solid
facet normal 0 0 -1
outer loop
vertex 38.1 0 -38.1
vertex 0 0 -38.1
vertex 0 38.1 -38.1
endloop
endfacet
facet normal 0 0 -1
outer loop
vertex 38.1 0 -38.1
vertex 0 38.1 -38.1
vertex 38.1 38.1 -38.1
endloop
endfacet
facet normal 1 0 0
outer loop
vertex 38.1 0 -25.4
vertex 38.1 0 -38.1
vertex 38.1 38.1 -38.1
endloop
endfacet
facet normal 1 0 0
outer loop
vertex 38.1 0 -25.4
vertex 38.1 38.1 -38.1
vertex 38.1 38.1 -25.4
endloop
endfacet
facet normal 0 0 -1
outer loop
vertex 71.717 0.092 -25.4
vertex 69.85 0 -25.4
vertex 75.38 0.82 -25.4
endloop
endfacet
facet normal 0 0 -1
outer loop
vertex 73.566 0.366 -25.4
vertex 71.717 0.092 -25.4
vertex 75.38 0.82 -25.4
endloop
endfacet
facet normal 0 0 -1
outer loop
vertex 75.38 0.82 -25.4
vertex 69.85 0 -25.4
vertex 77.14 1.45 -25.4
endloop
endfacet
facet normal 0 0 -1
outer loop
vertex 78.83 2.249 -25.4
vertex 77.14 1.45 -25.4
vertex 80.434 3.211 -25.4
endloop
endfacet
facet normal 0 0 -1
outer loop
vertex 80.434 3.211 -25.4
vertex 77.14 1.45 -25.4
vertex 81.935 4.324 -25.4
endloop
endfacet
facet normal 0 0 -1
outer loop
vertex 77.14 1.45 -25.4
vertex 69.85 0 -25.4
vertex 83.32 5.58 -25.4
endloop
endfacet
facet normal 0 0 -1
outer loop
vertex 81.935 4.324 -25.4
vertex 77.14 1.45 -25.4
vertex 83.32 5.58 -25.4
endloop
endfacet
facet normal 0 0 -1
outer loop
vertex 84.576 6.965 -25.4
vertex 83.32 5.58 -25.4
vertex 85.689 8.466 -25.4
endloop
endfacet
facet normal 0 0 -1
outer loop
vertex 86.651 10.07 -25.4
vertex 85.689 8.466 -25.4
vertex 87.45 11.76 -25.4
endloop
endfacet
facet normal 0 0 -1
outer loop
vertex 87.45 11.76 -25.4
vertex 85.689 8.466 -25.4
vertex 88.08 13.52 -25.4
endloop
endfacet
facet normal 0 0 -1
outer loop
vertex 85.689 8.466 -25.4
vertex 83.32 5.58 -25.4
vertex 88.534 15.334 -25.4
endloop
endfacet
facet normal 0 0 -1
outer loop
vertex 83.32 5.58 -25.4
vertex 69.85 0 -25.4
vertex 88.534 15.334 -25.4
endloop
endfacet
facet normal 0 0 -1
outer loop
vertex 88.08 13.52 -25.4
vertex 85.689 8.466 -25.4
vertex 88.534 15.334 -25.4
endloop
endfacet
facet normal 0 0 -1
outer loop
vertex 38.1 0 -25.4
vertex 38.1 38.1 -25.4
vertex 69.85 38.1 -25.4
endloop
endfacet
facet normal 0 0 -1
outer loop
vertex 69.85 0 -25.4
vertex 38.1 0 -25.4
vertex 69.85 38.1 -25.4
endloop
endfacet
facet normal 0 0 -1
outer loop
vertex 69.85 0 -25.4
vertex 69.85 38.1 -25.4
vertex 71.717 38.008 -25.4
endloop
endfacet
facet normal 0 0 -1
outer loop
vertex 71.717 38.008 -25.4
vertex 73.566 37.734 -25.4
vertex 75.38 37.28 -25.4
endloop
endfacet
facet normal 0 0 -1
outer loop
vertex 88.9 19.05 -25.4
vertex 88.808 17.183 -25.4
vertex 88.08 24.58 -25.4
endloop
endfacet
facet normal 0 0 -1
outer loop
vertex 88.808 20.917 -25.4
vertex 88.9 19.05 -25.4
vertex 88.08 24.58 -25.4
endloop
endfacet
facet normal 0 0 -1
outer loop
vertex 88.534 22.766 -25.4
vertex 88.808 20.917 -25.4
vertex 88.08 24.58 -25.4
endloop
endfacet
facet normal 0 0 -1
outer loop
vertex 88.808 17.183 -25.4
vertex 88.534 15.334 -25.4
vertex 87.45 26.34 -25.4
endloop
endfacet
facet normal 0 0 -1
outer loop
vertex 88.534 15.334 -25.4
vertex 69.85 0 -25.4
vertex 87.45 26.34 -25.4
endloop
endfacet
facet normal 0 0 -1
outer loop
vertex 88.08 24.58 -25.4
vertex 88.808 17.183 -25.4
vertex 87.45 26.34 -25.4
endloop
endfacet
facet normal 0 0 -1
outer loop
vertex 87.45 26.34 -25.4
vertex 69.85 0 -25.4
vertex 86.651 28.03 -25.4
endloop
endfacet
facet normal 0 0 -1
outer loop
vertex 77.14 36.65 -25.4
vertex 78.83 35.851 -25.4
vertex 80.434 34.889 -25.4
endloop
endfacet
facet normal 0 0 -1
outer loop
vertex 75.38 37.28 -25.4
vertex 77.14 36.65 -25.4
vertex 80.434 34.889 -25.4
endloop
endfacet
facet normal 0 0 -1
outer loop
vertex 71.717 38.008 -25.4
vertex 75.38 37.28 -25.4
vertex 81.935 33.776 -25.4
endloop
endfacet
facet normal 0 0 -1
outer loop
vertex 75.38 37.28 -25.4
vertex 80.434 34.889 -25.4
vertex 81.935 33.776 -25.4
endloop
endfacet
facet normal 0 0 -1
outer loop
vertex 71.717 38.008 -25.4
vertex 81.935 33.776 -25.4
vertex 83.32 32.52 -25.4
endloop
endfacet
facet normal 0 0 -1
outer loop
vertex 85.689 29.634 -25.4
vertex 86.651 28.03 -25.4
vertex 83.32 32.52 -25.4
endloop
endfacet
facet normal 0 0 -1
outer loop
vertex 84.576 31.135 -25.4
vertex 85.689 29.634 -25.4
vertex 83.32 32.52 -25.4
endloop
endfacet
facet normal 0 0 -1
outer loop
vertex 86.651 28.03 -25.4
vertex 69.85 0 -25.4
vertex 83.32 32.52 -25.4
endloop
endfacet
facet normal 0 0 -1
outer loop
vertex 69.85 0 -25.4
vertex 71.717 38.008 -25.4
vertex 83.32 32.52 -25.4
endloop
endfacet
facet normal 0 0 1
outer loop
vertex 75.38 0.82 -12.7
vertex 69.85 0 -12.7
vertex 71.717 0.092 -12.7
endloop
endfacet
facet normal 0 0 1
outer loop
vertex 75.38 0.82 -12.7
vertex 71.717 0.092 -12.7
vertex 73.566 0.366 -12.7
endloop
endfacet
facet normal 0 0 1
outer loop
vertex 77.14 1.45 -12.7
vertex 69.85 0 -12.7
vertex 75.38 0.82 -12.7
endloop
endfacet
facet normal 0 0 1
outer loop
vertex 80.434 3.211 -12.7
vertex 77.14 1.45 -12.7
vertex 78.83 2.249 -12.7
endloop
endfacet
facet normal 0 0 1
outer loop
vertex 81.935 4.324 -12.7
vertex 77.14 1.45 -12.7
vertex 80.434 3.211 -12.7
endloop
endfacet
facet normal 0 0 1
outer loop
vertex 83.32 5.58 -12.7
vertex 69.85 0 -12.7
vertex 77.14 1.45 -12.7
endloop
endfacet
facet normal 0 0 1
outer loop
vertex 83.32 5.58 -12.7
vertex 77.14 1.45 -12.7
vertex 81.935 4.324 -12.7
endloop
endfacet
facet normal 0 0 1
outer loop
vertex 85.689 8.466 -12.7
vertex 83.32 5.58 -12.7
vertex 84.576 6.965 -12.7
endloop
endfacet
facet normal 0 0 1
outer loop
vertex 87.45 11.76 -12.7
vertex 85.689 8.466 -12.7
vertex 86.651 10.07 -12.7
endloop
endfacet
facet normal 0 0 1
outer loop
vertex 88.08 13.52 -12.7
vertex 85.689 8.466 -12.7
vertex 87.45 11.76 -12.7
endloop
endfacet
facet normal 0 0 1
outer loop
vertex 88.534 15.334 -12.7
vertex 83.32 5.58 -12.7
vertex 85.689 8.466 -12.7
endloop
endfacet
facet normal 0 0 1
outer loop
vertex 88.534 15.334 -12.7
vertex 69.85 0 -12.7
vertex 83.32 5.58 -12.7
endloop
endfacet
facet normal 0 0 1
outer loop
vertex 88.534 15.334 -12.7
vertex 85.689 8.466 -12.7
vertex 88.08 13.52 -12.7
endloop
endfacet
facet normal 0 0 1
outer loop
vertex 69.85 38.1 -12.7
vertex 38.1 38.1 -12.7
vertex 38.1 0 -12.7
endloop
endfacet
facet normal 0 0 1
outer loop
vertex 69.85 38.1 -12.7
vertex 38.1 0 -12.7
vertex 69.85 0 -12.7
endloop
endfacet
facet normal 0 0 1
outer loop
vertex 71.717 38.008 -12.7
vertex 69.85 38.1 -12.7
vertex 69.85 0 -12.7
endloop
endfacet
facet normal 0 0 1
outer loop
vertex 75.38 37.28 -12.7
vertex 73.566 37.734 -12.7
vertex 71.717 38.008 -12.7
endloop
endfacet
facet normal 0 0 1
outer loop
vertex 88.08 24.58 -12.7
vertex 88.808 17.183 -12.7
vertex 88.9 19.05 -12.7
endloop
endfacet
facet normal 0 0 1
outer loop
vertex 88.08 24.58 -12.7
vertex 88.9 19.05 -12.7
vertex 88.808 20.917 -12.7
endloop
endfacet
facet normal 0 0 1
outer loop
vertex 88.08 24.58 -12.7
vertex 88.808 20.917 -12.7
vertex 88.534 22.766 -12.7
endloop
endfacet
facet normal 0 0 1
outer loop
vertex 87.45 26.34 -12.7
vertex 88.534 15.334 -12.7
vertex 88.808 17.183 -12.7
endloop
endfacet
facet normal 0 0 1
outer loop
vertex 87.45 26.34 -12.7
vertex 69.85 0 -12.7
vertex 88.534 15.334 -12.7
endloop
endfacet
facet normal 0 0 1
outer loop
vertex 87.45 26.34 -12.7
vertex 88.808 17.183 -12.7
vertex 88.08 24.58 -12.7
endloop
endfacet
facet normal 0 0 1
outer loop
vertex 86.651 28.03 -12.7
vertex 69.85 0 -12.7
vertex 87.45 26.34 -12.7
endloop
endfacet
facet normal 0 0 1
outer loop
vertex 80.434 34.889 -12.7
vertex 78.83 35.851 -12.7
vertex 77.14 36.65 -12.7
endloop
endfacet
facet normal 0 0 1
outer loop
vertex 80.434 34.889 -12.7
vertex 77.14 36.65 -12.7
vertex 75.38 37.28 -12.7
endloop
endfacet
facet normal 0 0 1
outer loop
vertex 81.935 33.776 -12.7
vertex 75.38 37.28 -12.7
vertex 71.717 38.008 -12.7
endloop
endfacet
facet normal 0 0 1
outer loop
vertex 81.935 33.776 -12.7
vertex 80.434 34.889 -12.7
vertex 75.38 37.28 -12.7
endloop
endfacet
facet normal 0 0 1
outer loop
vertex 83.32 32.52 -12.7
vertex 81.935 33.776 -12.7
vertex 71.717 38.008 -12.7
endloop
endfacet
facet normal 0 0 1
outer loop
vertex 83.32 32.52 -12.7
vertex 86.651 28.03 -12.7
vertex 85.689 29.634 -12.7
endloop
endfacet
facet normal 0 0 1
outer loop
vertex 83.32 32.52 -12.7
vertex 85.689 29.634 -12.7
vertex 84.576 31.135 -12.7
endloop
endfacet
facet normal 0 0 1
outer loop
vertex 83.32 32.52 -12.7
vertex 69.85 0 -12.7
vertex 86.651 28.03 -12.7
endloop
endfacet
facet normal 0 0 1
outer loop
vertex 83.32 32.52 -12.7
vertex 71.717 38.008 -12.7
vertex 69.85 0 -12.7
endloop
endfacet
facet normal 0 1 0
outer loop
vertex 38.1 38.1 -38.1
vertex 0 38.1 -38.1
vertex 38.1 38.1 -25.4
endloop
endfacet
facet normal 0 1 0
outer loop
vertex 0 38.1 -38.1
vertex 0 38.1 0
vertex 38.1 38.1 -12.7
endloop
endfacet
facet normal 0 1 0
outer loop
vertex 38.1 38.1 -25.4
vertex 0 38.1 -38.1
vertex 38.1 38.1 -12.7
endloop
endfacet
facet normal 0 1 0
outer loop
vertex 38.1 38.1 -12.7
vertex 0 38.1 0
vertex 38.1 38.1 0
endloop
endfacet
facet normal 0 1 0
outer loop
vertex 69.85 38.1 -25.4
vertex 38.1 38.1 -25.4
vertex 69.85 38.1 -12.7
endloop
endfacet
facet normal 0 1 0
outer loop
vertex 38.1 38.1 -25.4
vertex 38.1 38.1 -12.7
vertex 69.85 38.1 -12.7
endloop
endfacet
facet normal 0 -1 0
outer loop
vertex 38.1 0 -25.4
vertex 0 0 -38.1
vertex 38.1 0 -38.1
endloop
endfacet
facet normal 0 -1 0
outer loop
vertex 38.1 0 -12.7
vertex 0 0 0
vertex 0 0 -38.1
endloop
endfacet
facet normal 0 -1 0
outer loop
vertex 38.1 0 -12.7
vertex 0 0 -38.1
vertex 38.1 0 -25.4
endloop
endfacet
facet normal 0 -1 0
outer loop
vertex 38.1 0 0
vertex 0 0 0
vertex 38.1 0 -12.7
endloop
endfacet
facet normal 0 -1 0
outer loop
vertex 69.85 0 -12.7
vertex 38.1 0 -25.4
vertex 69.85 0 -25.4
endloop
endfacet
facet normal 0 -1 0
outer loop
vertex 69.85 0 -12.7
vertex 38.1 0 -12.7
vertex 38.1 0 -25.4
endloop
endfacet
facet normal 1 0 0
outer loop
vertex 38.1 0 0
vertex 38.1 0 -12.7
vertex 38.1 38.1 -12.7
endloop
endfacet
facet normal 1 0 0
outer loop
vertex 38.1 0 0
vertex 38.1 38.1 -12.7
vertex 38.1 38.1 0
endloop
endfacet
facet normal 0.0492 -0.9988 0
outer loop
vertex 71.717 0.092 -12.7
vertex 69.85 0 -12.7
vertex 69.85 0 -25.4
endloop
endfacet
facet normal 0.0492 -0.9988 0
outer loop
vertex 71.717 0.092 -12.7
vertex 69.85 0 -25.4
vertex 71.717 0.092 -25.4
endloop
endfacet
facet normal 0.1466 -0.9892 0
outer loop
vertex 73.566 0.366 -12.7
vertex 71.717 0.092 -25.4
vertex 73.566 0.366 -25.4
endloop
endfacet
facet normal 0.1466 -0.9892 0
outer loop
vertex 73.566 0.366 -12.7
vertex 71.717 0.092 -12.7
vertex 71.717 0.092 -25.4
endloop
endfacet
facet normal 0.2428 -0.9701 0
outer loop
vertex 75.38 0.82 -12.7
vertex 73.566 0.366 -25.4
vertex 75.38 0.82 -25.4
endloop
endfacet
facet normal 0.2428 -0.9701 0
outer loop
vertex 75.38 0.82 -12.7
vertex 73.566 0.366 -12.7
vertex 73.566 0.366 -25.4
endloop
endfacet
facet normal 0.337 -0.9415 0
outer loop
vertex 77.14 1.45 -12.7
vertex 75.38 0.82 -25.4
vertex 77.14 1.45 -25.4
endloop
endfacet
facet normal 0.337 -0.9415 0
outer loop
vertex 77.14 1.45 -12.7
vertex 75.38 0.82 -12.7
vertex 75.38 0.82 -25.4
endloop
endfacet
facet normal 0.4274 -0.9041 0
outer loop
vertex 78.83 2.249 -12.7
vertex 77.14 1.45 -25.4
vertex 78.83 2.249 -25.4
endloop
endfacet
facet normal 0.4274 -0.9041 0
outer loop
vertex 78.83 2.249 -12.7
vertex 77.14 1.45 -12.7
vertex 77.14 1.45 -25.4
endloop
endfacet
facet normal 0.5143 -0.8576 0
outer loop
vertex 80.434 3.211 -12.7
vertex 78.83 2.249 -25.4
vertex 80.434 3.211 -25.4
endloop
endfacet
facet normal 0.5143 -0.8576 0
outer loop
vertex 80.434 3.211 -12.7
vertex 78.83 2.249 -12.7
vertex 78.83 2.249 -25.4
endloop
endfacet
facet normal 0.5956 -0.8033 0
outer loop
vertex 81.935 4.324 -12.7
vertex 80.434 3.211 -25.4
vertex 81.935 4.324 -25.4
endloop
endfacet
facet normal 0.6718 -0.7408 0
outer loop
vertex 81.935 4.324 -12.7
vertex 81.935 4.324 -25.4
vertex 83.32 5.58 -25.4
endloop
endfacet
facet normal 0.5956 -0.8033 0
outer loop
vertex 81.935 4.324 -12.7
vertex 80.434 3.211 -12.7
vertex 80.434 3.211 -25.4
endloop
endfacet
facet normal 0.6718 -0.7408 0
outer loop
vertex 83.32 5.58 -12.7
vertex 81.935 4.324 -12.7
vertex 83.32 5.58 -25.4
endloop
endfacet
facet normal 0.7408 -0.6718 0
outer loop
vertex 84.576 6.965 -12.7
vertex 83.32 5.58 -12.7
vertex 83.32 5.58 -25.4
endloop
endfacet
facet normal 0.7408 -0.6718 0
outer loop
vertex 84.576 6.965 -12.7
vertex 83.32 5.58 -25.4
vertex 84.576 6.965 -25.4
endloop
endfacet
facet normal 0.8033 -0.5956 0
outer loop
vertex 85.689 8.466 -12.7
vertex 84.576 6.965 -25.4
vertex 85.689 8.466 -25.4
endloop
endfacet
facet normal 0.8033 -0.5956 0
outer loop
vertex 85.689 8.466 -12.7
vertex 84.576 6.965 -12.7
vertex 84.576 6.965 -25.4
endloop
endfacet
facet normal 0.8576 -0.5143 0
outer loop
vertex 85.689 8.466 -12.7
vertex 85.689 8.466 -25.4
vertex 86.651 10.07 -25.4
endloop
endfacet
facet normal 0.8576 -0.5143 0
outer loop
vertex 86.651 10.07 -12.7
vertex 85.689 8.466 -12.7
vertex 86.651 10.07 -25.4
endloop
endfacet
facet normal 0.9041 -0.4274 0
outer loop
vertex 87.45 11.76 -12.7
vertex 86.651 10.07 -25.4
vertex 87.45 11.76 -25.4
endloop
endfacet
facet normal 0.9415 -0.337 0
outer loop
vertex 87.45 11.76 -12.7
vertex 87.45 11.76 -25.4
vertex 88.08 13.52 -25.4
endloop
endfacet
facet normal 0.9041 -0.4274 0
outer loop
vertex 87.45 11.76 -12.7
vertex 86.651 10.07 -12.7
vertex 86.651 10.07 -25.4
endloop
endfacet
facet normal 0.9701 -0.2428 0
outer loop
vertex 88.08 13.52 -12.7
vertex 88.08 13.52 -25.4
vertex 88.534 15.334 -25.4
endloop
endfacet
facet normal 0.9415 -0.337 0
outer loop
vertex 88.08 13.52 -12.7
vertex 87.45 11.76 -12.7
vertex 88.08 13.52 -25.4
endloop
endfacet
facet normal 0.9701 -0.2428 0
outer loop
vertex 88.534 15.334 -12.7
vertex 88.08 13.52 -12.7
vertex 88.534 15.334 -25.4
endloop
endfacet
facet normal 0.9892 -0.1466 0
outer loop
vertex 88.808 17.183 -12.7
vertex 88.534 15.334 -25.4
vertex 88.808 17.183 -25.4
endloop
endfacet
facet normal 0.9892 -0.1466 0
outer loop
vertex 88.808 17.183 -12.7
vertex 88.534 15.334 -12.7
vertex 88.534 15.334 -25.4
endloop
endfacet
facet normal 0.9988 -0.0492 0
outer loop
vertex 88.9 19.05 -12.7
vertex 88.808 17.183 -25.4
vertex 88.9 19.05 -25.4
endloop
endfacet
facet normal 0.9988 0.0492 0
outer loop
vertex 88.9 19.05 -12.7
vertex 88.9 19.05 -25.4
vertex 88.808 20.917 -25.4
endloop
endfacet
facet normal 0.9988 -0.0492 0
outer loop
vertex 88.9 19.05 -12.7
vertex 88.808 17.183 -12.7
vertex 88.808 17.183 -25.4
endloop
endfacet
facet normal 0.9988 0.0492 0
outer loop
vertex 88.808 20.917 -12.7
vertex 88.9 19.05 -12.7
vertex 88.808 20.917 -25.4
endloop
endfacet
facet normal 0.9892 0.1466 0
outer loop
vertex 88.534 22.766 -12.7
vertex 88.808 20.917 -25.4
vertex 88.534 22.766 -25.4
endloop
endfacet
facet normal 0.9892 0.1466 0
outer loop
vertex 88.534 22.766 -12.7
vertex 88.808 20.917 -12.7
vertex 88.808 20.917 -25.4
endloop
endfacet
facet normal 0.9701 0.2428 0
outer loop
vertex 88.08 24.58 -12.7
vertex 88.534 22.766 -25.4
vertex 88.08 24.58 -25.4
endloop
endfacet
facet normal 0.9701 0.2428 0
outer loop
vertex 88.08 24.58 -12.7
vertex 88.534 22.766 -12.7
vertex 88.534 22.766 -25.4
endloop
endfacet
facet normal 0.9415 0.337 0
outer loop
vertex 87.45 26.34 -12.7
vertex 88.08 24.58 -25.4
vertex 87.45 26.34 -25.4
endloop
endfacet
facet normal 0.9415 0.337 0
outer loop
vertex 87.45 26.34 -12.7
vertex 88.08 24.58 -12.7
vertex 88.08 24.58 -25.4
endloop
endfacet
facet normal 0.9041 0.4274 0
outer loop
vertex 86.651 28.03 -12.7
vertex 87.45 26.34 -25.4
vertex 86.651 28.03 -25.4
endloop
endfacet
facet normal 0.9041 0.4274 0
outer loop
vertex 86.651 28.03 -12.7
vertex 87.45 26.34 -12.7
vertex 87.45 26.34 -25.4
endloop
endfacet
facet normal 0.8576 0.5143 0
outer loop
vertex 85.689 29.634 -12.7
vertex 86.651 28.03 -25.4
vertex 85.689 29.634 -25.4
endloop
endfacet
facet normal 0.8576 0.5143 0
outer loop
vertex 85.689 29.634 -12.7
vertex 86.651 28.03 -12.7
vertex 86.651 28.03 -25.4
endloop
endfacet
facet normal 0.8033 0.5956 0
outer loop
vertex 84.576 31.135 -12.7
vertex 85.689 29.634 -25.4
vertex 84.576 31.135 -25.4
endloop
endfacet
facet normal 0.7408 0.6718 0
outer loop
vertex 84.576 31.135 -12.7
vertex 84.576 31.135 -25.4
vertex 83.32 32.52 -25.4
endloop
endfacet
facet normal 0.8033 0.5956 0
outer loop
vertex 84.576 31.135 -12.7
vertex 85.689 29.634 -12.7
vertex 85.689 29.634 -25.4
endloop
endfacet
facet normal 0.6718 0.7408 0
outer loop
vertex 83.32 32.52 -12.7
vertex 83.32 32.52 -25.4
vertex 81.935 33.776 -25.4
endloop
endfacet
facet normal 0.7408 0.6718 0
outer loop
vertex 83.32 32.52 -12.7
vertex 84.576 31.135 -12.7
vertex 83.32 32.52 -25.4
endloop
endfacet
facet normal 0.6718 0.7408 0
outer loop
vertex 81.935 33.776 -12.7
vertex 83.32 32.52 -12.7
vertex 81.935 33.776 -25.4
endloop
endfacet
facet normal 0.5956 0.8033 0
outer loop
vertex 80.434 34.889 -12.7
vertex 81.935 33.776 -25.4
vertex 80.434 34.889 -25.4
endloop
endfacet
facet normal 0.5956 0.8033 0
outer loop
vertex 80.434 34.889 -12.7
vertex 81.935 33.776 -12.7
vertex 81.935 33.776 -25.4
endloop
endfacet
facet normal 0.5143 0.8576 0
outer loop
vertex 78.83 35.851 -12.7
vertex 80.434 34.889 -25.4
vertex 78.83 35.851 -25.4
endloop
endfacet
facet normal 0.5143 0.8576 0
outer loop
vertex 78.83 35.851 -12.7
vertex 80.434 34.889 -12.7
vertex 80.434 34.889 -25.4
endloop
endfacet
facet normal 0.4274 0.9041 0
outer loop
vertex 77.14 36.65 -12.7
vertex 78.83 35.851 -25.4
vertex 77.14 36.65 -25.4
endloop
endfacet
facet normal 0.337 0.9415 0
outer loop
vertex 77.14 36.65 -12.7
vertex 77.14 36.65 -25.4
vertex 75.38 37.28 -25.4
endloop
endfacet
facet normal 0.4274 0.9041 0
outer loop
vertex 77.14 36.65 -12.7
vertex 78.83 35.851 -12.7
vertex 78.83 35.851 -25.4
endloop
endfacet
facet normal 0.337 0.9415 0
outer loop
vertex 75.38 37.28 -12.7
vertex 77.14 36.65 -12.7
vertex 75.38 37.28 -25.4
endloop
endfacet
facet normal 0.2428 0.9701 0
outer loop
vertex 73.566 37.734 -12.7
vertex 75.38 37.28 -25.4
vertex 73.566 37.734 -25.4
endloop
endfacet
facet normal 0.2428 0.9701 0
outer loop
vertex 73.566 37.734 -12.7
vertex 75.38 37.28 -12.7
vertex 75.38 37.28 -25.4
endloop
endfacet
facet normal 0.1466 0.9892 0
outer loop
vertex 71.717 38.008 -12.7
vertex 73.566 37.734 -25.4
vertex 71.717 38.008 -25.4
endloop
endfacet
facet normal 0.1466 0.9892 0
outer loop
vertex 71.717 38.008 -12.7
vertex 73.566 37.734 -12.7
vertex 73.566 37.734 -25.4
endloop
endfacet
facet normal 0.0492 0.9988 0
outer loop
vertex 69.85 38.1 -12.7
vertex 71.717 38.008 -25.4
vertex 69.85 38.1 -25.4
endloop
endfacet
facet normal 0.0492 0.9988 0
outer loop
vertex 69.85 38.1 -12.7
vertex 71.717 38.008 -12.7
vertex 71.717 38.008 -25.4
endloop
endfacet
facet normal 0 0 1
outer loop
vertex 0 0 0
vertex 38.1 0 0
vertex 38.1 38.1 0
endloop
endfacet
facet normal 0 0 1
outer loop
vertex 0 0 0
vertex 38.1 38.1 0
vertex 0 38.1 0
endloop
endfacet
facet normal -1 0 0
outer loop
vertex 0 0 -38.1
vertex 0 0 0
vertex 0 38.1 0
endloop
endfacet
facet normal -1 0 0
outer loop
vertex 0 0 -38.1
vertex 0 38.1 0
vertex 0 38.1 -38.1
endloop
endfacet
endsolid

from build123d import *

# Parameters (mm, degrees)
F1_DEPTH = 38.1
F3_DEPTH = 12.7


with BuildPart() as f1:
    # F0 (on Front) → F1 (new body)
    with BuildSketch(Plane.XZ):
        Polygon((38.1, 0), (0, 0), (0, -38.1), (38.1, -38.1), (38.1, -25.4), (69.85, -25.4), (69.85, -12.7), (38.1, -12.7), align=None)
    extrude(amount=-F1_DEPTH)

    # F2 (on face) → F3 (join, through all)
    with BuildSketch(Plane.XY.offset(-12.7)):
        with BuildLine():
            Line((69.85, 38.1), (69.85, 0))
            ThreePointArc((69.85, 0), (88.9, 19.05), (69.85, 38.1))
        make_face()
    extrude(amount=-F3_DEPTH)


solid = f1.part
